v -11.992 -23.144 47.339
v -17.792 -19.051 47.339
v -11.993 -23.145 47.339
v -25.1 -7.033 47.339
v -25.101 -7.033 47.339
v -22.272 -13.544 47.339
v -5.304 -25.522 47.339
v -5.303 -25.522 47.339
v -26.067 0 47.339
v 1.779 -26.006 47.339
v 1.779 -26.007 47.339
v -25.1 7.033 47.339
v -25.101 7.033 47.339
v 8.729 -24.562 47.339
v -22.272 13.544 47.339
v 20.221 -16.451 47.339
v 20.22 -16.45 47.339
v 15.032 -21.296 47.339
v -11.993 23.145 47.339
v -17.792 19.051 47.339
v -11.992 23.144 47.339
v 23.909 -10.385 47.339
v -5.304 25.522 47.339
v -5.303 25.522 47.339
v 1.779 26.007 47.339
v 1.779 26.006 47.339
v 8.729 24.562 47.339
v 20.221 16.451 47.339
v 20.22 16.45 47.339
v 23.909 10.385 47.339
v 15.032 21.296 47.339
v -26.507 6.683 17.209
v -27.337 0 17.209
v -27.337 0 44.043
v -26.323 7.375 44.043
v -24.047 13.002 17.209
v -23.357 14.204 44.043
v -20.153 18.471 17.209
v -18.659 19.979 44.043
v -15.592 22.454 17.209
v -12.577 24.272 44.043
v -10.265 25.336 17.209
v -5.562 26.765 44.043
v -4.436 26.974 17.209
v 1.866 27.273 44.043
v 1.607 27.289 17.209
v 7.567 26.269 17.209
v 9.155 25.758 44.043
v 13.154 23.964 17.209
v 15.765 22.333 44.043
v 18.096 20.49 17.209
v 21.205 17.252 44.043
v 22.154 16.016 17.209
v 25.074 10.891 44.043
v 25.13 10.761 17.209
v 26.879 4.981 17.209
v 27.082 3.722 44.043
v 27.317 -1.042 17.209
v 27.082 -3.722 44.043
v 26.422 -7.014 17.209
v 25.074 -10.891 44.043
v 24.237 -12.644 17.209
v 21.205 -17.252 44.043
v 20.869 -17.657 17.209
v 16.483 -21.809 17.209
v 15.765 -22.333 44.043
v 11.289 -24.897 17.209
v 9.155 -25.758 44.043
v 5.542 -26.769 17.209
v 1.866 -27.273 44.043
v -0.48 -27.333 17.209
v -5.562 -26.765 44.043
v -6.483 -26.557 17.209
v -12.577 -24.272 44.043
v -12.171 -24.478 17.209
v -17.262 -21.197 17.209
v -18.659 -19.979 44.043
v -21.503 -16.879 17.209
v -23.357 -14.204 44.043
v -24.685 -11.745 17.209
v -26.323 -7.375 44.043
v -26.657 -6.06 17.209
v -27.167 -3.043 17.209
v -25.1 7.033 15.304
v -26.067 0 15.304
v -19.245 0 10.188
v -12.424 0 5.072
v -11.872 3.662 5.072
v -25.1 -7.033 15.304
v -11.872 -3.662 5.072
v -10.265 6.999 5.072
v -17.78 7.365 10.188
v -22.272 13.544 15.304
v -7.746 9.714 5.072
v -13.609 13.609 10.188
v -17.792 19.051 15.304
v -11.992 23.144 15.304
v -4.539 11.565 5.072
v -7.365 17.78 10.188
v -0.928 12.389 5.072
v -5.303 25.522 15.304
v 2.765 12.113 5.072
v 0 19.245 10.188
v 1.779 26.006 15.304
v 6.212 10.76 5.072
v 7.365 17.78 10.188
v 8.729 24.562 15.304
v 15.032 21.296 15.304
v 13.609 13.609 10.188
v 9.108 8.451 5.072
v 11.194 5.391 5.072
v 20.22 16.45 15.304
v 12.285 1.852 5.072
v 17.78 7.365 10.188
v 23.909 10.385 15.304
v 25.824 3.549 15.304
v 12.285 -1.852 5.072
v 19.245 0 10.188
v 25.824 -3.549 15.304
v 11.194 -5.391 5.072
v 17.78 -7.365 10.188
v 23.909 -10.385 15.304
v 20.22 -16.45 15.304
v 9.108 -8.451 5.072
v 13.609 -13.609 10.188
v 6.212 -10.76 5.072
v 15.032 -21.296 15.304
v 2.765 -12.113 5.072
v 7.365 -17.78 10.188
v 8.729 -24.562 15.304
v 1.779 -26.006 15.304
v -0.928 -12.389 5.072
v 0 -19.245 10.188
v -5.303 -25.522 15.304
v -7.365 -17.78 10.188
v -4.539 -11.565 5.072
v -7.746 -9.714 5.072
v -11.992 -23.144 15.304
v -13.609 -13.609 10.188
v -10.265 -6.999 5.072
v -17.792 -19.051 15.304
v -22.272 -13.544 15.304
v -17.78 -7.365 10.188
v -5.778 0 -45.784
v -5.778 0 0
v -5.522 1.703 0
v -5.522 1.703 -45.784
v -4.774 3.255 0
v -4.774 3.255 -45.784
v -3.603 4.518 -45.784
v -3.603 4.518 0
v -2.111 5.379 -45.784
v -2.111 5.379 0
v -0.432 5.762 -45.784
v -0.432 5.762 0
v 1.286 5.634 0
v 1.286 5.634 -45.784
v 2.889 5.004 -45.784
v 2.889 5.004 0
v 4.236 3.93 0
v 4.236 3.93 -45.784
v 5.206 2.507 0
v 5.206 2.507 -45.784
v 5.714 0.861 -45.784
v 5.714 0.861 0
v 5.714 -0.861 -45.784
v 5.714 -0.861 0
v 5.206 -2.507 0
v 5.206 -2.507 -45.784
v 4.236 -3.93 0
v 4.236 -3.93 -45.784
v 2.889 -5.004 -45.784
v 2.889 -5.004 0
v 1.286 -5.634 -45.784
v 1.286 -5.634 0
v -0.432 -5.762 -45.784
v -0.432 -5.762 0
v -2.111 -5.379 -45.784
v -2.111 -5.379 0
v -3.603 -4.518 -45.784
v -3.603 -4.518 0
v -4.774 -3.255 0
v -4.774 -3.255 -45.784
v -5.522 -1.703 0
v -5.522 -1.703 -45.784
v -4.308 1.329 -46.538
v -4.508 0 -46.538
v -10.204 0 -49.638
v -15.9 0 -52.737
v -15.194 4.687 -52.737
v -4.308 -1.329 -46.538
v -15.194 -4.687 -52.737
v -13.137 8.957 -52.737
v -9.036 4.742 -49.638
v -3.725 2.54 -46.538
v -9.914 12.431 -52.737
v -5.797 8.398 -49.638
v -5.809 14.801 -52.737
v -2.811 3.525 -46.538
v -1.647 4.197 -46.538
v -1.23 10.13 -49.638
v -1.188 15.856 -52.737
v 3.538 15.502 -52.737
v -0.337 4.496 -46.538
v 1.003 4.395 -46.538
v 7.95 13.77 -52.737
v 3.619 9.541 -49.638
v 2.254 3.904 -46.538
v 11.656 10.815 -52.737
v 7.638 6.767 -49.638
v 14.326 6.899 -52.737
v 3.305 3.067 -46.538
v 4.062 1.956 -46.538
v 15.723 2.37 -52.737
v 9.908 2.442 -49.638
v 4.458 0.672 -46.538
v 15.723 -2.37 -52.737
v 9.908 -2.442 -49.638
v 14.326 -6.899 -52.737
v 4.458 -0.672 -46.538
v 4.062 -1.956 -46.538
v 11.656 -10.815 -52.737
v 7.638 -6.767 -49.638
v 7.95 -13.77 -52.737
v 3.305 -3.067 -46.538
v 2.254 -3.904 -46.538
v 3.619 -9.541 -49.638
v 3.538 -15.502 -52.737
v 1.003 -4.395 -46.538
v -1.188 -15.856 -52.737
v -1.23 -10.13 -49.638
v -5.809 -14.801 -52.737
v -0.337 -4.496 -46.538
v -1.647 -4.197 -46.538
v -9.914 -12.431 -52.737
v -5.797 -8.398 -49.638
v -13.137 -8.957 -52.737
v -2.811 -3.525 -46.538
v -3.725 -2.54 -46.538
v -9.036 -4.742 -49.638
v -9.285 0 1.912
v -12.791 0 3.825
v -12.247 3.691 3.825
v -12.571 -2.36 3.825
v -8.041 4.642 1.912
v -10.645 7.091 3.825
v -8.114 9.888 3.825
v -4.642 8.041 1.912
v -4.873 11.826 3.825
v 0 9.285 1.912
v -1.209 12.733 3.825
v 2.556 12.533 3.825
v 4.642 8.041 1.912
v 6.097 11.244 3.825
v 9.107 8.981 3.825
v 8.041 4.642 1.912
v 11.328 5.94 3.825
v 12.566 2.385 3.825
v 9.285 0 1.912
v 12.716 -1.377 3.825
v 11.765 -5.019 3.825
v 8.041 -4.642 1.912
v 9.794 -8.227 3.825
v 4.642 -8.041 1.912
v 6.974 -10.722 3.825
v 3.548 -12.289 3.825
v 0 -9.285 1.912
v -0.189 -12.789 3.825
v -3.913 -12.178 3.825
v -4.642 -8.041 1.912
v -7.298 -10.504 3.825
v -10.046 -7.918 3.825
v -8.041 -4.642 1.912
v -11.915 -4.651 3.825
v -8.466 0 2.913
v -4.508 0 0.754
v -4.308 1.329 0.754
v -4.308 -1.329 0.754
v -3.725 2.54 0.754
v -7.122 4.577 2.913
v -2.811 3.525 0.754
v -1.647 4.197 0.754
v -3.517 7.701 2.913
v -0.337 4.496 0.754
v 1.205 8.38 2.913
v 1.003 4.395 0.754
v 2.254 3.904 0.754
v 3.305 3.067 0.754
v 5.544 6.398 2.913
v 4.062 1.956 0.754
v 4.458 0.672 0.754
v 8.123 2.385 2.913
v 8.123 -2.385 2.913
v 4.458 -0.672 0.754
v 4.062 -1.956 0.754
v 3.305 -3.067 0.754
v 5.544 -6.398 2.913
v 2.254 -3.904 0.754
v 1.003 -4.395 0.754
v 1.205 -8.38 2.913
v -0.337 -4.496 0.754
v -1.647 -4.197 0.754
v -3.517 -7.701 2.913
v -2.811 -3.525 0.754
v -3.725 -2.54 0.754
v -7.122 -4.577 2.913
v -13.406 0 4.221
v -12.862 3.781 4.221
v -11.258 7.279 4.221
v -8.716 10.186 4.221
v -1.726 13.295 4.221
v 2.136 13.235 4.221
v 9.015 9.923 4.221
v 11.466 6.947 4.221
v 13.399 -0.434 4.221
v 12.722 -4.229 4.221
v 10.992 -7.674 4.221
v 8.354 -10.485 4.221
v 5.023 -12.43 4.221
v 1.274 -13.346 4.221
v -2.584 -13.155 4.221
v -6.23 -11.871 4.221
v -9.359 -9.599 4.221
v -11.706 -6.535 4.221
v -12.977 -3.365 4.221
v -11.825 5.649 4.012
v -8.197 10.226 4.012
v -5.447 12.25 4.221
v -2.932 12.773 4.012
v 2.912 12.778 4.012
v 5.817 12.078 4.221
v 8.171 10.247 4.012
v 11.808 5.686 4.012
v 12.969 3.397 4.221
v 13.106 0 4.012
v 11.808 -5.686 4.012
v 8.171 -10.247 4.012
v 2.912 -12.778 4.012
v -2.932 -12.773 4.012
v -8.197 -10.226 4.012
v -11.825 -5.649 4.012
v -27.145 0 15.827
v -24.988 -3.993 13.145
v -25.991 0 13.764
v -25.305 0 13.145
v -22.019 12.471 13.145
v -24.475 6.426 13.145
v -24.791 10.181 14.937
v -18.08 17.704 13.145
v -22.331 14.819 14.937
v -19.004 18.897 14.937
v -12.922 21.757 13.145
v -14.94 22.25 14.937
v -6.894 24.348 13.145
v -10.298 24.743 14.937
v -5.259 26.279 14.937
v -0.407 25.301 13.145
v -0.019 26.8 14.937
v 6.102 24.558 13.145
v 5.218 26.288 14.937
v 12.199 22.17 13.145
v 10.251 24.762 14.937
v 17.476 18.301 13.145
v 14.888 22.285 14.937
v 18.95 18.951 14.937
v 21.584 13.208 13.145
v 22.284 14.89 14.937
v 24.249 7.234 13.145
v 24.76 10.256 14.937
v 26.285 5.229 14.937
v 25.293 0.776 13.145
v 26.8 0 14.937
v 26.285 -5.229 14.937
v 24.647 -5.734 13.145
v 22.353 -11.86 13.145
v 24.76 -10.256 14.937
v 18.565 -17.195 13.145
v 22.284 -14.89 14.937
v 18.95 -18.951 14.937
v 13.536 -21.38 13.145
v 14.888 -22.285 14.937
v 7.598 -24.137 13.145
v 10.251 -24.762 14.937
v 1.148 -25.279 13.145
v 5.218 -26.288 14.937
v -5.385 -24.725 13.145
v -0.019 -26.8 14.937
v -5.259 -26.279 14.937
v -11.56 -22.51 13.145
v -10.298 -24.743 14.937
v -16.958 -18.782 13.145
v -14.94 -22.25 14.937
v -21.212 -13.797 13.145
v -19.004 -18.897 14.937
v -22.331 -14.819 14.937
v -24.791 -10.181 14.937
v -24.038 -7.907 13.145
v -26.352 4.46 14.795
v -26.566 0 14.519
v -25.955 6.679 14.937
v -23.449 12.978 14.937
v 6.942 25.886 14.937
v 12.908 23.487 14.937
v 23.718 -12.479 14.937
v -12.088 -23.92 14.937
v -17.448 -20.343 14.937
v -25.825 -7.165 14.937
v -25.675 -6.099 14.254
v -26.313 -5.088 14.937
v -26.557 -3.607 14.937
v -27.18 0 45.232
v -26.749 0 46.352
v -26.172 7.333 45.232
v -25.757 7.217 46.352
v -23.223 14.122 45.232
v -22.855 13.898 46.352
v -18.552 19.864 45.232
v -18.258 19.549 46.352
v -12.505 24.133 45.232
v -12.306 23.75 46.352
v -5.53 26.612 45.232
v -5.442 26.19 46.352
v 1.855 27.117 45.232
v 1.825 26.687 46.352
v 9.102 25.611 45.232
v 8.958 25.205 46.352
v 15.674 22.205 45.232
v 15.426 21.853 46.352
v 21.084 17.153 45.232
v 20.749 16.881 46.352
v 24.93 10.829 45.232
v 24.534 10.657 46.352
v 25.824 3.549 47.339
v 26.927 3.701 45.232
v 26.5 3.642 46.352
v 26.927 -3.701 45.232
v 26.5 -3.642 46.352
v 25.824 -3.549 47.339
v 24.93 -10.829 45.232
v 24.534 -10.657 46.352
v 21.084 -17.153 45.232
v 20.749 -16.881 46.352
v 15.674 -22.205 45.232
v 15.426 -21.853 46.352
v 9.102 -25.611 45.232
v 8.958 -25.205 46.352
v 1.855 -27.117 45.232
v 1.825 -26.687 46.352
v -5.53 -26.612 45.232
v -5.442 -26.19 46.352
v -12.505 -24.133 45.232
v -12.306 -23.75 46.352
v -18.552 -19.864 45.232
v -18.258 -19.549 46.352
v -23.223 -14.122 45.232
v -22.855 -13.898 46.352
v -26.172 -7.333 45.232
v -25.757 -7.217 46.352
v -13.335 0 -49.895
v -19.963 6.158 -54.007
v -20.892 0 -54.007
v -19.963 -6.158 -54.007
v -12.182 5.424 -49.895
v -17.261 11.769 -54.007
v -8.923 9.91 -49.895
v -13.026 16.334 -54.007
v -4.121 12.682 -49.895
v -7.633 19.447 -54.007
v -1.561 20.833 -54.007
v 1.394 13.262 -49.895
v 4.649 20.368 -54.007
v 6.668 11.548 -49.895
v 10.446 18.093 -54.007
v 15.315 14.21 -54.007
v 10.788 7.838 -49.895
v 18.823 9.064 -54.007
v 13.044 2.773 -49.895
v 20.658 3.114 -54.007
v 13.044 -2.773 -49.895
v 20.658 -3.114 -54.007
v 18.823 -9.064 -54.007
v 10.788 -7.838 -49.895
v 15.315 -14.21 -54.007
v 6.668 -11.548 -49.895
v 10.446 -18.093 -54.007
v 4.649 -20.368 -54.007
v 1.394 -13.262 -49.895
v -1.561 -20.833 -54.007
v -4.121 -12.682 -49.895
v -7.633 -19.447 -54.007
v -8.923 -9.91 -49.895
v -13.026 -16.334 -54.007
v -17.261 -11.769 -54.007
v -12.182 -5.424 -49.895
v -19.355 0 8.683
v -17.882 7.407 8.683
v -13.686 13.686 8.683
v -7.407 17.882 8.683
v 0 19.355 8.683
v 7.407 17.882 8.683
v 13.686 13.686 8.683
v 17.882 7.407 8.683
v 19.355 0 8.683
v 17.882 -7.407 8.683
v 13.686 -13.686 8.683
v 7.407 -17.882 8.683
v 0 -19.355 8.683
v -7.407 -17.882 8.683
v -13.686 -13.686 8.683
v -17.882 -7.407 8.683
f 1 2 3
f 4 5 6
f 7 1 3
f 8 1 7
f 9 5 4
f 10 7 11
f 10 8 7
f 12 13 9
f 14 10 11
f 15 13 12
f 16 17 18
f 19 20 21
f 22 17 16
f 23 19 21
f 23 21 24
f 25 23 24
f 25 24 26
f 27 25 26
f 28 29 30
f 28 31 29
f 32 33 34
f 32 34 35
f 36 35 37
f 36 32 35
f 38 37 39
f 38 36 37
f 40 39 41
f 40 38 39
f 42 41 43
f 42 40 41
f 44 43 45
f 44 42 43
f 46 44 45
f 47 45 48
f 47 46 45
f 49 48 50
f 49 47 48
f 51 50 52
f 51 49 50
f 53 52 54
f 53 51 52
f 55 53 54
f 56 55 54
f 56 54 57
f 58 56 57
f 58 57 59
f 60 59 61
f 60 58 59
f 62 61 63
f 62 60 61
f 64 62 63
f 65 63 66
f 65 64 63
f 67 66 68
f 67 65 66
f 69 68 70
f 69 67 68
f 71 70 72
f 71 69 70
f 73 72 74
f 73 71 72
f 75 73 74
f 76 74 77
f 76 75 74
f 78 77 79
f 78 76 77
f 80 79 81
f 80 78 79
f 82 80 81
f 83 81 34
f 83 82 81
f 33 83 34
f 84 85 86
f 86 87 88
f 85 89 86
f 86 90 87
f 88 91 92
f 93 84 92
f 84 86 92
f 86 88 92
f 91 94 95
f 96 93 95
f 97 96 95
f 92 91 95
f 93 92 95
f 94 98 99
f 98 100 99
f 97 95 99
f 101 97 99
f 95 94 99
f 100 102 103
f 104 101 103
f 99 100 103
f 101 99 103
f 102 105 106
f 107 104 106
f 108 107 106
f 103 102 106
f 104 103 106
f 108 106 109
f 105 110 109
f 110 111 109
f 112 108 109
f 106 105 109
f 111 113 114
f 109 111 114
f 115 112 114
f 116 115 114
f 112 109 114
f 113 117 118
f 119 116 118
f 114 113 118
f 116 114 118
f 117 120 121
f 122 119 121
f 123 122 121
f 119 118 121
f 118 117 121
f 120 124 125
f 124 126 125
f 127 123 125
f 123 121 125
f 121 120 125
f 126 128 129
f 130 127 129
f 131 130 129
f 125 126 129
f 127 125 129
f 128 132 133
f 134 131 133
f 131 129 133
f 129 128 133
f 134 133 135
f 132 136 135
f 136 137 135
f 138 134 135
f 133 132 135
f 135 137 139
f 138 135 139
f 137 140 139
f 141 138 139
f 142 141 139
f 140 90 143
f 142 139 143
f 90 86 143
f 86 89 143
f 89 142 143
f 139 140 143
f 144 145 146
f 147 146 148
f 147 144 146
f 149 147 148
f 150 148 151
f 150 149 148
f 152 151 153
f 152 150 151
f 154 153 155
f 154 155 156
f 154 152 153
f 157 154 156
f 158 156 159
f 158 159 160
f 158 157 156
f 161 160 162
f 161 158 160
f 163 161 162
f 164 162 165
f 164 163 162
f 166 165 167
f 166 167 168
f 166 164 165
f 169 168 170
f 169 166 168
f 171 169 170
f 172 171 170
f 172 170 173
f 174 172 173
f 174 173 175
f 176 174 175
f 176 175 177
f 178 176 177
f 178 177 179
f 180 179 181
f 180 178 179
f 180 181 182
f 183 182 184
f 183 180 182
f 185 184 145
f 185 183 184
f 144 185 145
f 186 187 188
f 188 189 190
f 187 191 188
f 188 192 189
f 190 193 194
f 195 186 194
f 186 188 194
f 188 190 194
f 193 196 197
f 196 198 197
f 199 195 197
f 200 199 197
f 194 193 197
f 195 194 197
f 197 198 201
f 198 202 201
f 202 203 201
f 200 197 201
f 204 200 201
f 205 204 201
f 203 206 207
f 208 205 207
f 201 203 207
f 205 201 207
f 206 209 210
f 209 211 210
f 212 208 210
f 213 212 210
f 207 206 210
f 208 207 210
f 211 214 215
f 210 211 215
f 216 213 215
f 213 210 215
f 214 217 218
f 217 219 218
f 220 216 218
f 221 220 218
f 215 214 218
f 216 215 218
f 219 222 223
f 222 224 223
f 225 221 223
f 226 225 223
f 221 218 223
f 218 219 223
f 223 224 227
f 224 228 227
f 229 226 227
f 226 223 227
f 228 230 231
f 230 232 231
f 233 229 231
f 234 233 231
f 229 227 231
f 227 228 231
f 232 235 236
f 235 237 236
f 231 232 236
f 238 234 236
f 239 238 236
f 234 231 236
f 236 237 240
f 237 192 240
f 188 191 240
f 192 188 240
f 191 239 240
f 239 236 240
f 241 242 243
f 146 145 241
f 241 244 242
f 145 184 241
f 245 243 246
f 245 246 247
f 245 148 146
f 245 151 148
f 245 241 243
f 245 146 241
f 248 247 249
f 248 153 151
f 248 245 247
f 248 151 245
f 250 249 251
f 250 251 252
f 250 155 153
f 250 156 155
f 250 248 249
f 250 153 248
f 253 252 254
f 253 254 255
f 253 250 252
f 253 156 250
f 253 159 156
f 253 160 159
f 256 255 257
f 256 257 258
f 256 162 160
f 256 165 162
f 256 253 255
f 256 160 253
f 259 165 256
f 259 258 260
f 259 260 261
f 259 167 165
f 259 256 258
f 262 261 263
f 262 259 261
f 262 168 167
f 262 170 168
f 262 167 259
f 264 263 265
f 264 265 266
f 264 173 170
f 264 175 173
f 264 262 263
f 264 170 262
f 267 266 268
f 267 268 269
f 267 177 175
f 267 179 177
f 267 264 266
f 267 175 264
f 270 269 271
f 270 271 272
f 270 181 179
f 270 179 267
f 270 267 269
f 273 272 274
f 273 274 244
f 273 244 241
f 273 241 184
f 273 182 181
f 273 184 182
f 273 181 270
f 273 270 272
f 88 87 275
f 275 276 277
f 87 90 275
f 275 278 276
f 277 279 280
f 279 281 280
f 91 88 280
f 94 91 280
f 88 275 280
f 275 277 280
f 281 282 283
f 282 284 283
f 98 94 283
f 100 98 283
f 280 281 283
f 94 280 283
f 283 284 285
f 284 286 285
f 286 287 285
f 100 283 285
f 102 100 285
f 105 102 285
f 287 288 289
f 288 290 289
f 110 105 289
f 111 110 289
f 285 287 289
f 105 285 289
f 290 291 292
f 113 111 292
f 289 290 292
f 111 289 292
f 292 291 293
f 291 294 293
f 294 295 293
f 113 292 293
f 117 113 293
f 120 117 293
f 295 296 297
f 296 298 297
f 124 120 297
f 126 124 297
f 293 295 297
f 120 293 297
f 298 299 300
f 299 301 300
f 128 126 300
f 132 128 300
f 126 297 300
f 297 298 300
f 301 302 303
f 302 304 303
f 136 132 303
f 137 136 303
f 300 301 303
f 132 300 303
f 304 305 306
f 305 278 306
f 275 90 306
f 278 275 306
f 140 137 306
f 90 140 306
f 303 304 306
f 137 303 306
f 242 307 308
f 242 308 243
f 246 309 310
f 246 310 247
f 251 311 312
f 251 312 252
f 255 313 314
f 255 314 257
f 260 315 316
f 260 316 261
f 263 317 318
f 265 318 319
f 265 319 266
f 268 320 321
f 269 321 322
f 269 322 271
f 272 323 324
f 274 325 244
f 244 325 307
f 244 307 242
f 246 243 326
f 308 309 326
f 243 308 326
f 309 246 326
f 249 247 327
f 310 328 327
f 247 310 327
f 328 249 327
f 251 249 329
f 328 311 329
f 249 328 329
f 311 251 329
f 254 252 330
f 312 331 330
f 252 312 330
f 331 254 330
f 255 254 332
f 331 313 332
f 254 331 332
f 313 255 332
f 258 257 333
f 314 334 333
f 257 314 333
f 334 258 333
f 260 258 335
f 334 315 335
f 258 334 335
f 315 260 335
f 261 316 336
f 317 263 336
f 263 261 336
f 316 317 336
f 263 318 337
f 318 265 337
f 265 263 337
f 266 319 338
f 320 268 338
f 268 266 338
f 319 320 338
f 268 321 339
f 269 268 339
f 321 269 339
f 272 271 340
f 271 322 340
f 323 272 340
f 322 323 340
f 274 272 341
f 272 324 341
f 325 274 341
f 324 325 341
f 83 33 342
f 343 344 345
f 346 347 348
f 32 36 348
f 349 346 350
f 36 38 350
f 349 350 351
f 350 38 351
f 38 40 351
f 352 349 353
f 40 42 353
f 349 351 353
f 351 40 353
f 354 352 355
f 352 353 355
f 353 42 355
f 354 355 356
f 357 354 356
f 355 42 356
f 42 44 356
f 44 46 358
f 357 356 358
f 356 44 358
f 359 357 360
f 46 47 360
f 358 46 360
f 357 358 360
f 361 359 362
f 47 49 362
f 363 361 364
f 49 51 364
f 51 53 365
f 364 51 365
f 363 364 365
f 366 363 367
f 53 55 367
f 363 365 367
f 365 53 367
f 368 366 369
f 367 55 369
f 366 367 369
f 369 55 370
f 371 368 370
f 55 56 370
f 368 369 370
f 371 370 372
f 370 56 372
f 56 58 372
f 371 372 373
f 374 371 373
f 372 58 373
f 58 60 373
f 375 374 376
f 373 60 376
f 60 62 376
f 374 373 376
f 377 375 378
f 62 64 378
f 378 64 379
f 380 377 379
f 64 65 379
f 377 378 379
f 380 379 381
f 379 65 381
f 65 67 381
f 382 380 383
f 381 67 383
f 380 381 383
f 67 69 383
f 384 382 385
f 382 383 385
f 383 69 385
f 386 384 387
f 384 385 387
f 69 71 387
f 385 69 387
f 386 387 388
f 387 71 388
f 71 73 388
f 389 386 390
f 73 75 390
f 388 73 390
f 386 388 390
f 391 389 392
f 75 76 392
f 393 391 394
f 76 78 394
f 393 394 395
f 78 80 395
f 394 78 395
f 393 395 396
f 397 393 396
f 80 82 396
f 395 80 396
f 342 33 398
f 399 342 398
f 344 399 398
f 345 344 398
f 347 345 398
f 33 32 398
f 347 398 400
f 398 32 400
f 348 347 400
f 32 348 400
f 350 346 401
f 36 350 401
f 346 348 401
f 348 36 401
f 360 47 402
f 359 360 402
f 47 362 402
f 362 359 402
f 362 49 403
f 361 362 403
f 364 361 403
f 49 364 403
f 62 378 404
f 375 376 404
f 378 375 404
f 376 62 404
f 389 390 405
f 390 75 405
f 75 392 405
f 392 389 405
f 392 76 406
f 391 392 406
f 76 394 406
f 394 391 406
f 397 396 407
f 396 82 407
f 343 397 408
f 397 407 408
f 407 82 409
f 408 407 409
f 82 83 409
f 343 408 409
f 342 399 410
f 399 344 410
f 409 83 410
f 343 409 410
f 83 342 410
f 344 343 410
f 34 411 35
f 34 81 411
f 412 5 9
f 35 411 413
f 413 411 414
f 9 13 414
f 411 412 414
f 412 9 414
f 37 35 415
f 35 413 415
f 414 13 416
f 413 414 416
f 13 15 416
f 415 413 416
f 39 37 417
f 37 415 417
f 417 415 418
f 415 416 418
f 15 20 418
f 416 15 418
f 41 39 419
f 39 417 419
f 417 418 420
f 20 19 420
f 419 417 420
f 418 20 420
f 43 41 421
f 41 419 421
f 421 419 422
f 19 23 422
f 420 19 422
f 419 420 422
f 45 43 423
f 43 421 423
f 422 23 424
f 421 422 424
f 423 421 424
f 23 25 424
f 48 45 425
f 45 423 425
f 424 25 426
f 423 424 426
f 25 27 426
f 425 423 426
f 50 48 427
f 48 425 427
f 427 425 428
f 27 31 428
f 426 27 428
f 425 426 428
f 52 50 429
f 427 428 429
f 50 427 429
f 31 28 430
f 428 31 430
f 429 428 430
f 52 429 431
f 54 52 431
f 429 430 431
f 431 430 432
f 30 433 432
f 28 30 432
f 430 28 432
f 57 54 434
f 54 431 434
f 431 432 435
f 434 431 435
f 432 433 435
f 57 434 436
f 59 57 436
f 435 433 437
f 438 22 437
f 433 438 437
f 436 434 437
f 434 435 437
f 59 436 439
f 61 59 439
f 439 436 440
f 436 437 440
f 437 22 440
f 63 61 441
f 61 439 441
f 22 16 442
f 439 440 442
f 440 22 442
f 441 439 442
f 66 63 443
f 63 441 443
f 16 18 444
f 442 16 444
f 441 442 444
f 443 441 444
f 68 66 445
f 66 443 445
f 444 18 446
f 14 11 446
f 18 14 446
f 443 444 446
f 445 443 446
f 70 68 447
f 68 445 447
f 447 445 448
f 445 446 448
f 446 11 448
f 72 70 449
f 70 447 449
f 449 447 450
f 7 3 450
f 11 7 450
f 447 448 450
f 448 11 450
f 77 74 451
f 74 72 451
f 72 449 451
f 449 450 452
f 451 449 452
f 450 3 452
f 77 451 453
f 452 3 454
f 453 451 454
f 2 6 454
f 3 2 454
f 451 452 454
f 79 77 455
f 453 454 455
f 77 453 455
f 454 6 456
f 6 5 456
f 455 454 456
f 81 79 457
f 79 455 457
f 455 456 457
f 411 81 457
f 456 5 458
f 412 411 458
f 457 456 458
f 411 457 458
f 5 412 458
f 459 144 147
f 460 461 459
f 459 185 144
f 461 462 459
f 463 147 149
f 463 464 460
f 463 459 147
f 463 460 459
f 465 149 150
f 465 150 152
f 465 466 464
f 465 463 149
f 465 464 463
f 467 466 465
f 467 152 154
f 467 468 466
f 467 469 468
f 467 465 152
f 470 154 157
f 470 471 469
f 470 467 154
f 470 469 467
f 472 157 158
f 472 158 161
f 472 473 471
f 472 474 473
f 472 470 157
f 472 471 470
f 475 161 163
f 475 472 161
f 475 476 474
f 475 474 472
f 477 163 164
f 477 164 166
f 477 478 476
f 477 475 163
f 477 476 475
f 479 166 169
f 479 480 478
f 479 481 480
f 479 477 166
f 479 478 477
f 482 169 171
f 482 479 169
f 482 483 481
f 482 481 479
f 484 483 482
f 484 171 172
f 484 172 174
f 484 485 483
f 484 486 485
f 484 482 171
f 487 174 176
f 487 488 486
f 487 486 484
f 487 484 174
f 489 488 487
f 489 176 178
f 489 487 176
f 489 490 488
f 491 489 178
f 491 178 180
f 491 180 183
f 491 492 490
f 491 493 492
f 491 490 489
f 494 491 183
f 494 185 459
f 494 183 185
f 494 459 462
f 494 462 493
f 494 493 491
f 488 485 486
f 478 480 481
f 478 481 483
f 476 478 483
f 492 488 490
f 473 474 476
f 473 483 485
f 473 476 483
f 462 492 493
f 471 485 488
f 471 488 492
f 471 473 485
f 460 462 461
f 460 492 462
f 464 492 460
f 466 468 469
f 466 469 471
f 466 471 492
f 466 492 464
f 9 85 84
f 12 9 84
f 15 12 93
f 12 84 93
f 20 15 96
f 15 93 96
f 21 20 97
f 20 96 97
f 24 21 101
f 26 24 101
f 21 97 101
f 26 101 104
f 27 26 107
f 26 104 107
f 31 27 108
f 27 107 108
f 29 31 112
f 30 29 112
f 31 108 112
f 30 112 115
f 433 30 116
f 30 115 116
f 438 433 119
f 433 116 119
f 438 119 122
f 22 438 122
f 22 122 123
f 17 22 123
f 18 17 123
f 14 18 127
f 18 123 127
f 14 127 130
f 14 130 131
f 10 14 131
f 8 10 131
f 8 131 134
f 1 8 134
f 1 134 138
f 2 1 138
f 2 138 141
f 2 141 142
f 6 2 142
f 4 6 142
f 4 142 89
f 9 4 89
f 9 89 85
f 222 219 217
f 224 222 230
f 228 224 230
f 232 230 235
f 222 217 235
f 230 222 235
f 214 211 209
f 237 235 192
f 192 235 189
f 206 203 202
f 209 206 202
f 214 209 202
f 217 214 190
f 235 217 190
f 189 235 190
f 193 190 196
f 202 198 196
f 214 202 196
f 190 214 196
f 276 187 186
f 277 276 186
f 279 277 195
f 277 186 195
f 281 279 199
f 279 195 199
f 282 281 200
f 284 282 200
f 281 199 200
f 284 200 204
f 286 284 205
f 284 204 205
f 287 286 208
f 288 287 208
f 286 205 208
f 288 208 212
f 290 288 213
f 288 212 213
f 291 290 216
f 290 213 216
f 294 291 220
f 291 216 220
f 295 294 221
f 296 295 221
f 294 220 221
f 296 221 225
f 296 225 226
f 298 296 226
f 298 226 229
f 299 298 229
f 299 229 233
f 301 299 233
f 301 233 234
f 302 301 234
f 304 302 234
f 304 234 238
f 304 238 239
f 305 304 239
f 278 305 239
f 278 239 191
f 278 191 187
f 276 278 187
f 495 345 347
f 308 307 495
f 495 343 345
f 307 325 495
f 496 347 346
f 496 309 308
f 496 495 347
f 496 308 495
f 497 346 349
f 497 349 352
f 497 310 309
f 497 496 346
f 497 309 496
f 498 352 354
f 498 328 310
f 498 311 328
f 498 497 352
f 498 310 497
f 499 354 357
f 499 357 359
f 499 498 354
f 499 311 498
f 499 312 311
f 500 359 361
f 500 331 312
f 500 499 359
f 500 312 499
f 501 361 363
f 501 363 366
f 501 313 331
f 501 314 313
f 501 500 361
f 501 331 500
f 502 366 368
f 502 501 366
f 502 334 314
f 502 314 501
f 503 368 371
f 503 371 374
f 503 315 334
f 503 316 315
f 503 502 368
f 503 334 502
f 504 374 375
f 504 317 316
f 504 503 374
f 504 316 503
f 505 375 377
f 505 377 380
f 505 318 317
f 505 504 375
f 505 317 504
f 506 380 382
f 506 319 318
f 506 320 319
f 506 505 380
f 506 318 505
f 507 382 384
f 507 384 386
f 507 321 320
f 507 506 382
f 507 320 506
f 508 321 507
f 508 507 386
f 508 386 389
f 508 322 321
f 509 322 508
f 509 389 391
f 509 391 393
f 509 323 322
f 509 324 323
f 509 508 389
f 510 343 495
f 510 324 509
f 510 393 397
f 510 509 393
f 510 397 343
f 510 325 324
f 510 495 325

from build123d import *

# Parameters (mm, degrees)
F2_T = -1.27
F4_R = 5.08


# Not quite as in the source:
# - a fillet or chamfer that OpenCascade refuses, or shapes differently, is made with other operations: its cross-section is extruded or revolved along the edge and cut away or added


with BuildPart() as f1:
    # F0 (on Front) → F1 (revolve)
    with BuildSketch(Plane.XZ):
        Polygon((0, -54.0067516267), (0, 47.3392494023), (-27.3367501795, 47.3392494023), (-27.3367501795, 14.6685000509), (-13.1127499044, 4.0005003102), (-5.7784998789, 0), (-5.7784998789, -45.7835011184), (-20.8915006369, -54.0067516267), align=None)
    revolve(axis=Axis((0, 0, -3.3337511122), (0, 0, -1)))

    # F2
    f2_openings = [f1.faces().sort_by_distance(p)[0] for p in [
        (0, 0, 47.339249),
    ]]
    offset(amount=F2_T, openings=f2_openings, kind=Kind.INTERSECTION)

    # F3: fillet of radius 5.08 on 1 edges, made by hand

    # F3_s1 → F3_t2 (revolve, cut)
    with BuildSketch(Plane.XZ):
        with BuildLine():
            ThreePointArc((-27.3371501795, 43.9787802623), (-27.0090313843, 45.775143597), (-26.0670501985, 47.3395139559))
            Line((-26.0670501985, 47.3395139559), (-26.448176769, 47.6755873252))
            ThreePointArc((-26.448176769, 47.6755873252), (-26.701900189, 47.8473859708), (-27.3367501795, 47.8473859708))
            Line((-27.3367501795, 47.8473859708), (-27.8448867481, 47.3392494023))
            ThreePointArc((-27.8448867481, 47.3392494023), (-27.8448867481, 45.6590148323), (-27.8452867481, 43.9787802623))
            Line((-27.8452867481, 43.9787802623), (-27.3371501795, 43.9787802623))
        make_face()
    revolve(axis=Axis((0, 0, 47.3392494023), (0, 0, -1)), mode=Mode.SUBTRACT)

    # F4
    f4_edges = [f1.edges().sort_by_distance(p)[0] for p in [
        (27.33675, 0, 14.6685),
        (13.11275, 0, 4.0005),
        (-20.22475, 0, 9.3345),
    ]]
    fillet(f4_edges, radius=F4_R)


solid = f1.part
